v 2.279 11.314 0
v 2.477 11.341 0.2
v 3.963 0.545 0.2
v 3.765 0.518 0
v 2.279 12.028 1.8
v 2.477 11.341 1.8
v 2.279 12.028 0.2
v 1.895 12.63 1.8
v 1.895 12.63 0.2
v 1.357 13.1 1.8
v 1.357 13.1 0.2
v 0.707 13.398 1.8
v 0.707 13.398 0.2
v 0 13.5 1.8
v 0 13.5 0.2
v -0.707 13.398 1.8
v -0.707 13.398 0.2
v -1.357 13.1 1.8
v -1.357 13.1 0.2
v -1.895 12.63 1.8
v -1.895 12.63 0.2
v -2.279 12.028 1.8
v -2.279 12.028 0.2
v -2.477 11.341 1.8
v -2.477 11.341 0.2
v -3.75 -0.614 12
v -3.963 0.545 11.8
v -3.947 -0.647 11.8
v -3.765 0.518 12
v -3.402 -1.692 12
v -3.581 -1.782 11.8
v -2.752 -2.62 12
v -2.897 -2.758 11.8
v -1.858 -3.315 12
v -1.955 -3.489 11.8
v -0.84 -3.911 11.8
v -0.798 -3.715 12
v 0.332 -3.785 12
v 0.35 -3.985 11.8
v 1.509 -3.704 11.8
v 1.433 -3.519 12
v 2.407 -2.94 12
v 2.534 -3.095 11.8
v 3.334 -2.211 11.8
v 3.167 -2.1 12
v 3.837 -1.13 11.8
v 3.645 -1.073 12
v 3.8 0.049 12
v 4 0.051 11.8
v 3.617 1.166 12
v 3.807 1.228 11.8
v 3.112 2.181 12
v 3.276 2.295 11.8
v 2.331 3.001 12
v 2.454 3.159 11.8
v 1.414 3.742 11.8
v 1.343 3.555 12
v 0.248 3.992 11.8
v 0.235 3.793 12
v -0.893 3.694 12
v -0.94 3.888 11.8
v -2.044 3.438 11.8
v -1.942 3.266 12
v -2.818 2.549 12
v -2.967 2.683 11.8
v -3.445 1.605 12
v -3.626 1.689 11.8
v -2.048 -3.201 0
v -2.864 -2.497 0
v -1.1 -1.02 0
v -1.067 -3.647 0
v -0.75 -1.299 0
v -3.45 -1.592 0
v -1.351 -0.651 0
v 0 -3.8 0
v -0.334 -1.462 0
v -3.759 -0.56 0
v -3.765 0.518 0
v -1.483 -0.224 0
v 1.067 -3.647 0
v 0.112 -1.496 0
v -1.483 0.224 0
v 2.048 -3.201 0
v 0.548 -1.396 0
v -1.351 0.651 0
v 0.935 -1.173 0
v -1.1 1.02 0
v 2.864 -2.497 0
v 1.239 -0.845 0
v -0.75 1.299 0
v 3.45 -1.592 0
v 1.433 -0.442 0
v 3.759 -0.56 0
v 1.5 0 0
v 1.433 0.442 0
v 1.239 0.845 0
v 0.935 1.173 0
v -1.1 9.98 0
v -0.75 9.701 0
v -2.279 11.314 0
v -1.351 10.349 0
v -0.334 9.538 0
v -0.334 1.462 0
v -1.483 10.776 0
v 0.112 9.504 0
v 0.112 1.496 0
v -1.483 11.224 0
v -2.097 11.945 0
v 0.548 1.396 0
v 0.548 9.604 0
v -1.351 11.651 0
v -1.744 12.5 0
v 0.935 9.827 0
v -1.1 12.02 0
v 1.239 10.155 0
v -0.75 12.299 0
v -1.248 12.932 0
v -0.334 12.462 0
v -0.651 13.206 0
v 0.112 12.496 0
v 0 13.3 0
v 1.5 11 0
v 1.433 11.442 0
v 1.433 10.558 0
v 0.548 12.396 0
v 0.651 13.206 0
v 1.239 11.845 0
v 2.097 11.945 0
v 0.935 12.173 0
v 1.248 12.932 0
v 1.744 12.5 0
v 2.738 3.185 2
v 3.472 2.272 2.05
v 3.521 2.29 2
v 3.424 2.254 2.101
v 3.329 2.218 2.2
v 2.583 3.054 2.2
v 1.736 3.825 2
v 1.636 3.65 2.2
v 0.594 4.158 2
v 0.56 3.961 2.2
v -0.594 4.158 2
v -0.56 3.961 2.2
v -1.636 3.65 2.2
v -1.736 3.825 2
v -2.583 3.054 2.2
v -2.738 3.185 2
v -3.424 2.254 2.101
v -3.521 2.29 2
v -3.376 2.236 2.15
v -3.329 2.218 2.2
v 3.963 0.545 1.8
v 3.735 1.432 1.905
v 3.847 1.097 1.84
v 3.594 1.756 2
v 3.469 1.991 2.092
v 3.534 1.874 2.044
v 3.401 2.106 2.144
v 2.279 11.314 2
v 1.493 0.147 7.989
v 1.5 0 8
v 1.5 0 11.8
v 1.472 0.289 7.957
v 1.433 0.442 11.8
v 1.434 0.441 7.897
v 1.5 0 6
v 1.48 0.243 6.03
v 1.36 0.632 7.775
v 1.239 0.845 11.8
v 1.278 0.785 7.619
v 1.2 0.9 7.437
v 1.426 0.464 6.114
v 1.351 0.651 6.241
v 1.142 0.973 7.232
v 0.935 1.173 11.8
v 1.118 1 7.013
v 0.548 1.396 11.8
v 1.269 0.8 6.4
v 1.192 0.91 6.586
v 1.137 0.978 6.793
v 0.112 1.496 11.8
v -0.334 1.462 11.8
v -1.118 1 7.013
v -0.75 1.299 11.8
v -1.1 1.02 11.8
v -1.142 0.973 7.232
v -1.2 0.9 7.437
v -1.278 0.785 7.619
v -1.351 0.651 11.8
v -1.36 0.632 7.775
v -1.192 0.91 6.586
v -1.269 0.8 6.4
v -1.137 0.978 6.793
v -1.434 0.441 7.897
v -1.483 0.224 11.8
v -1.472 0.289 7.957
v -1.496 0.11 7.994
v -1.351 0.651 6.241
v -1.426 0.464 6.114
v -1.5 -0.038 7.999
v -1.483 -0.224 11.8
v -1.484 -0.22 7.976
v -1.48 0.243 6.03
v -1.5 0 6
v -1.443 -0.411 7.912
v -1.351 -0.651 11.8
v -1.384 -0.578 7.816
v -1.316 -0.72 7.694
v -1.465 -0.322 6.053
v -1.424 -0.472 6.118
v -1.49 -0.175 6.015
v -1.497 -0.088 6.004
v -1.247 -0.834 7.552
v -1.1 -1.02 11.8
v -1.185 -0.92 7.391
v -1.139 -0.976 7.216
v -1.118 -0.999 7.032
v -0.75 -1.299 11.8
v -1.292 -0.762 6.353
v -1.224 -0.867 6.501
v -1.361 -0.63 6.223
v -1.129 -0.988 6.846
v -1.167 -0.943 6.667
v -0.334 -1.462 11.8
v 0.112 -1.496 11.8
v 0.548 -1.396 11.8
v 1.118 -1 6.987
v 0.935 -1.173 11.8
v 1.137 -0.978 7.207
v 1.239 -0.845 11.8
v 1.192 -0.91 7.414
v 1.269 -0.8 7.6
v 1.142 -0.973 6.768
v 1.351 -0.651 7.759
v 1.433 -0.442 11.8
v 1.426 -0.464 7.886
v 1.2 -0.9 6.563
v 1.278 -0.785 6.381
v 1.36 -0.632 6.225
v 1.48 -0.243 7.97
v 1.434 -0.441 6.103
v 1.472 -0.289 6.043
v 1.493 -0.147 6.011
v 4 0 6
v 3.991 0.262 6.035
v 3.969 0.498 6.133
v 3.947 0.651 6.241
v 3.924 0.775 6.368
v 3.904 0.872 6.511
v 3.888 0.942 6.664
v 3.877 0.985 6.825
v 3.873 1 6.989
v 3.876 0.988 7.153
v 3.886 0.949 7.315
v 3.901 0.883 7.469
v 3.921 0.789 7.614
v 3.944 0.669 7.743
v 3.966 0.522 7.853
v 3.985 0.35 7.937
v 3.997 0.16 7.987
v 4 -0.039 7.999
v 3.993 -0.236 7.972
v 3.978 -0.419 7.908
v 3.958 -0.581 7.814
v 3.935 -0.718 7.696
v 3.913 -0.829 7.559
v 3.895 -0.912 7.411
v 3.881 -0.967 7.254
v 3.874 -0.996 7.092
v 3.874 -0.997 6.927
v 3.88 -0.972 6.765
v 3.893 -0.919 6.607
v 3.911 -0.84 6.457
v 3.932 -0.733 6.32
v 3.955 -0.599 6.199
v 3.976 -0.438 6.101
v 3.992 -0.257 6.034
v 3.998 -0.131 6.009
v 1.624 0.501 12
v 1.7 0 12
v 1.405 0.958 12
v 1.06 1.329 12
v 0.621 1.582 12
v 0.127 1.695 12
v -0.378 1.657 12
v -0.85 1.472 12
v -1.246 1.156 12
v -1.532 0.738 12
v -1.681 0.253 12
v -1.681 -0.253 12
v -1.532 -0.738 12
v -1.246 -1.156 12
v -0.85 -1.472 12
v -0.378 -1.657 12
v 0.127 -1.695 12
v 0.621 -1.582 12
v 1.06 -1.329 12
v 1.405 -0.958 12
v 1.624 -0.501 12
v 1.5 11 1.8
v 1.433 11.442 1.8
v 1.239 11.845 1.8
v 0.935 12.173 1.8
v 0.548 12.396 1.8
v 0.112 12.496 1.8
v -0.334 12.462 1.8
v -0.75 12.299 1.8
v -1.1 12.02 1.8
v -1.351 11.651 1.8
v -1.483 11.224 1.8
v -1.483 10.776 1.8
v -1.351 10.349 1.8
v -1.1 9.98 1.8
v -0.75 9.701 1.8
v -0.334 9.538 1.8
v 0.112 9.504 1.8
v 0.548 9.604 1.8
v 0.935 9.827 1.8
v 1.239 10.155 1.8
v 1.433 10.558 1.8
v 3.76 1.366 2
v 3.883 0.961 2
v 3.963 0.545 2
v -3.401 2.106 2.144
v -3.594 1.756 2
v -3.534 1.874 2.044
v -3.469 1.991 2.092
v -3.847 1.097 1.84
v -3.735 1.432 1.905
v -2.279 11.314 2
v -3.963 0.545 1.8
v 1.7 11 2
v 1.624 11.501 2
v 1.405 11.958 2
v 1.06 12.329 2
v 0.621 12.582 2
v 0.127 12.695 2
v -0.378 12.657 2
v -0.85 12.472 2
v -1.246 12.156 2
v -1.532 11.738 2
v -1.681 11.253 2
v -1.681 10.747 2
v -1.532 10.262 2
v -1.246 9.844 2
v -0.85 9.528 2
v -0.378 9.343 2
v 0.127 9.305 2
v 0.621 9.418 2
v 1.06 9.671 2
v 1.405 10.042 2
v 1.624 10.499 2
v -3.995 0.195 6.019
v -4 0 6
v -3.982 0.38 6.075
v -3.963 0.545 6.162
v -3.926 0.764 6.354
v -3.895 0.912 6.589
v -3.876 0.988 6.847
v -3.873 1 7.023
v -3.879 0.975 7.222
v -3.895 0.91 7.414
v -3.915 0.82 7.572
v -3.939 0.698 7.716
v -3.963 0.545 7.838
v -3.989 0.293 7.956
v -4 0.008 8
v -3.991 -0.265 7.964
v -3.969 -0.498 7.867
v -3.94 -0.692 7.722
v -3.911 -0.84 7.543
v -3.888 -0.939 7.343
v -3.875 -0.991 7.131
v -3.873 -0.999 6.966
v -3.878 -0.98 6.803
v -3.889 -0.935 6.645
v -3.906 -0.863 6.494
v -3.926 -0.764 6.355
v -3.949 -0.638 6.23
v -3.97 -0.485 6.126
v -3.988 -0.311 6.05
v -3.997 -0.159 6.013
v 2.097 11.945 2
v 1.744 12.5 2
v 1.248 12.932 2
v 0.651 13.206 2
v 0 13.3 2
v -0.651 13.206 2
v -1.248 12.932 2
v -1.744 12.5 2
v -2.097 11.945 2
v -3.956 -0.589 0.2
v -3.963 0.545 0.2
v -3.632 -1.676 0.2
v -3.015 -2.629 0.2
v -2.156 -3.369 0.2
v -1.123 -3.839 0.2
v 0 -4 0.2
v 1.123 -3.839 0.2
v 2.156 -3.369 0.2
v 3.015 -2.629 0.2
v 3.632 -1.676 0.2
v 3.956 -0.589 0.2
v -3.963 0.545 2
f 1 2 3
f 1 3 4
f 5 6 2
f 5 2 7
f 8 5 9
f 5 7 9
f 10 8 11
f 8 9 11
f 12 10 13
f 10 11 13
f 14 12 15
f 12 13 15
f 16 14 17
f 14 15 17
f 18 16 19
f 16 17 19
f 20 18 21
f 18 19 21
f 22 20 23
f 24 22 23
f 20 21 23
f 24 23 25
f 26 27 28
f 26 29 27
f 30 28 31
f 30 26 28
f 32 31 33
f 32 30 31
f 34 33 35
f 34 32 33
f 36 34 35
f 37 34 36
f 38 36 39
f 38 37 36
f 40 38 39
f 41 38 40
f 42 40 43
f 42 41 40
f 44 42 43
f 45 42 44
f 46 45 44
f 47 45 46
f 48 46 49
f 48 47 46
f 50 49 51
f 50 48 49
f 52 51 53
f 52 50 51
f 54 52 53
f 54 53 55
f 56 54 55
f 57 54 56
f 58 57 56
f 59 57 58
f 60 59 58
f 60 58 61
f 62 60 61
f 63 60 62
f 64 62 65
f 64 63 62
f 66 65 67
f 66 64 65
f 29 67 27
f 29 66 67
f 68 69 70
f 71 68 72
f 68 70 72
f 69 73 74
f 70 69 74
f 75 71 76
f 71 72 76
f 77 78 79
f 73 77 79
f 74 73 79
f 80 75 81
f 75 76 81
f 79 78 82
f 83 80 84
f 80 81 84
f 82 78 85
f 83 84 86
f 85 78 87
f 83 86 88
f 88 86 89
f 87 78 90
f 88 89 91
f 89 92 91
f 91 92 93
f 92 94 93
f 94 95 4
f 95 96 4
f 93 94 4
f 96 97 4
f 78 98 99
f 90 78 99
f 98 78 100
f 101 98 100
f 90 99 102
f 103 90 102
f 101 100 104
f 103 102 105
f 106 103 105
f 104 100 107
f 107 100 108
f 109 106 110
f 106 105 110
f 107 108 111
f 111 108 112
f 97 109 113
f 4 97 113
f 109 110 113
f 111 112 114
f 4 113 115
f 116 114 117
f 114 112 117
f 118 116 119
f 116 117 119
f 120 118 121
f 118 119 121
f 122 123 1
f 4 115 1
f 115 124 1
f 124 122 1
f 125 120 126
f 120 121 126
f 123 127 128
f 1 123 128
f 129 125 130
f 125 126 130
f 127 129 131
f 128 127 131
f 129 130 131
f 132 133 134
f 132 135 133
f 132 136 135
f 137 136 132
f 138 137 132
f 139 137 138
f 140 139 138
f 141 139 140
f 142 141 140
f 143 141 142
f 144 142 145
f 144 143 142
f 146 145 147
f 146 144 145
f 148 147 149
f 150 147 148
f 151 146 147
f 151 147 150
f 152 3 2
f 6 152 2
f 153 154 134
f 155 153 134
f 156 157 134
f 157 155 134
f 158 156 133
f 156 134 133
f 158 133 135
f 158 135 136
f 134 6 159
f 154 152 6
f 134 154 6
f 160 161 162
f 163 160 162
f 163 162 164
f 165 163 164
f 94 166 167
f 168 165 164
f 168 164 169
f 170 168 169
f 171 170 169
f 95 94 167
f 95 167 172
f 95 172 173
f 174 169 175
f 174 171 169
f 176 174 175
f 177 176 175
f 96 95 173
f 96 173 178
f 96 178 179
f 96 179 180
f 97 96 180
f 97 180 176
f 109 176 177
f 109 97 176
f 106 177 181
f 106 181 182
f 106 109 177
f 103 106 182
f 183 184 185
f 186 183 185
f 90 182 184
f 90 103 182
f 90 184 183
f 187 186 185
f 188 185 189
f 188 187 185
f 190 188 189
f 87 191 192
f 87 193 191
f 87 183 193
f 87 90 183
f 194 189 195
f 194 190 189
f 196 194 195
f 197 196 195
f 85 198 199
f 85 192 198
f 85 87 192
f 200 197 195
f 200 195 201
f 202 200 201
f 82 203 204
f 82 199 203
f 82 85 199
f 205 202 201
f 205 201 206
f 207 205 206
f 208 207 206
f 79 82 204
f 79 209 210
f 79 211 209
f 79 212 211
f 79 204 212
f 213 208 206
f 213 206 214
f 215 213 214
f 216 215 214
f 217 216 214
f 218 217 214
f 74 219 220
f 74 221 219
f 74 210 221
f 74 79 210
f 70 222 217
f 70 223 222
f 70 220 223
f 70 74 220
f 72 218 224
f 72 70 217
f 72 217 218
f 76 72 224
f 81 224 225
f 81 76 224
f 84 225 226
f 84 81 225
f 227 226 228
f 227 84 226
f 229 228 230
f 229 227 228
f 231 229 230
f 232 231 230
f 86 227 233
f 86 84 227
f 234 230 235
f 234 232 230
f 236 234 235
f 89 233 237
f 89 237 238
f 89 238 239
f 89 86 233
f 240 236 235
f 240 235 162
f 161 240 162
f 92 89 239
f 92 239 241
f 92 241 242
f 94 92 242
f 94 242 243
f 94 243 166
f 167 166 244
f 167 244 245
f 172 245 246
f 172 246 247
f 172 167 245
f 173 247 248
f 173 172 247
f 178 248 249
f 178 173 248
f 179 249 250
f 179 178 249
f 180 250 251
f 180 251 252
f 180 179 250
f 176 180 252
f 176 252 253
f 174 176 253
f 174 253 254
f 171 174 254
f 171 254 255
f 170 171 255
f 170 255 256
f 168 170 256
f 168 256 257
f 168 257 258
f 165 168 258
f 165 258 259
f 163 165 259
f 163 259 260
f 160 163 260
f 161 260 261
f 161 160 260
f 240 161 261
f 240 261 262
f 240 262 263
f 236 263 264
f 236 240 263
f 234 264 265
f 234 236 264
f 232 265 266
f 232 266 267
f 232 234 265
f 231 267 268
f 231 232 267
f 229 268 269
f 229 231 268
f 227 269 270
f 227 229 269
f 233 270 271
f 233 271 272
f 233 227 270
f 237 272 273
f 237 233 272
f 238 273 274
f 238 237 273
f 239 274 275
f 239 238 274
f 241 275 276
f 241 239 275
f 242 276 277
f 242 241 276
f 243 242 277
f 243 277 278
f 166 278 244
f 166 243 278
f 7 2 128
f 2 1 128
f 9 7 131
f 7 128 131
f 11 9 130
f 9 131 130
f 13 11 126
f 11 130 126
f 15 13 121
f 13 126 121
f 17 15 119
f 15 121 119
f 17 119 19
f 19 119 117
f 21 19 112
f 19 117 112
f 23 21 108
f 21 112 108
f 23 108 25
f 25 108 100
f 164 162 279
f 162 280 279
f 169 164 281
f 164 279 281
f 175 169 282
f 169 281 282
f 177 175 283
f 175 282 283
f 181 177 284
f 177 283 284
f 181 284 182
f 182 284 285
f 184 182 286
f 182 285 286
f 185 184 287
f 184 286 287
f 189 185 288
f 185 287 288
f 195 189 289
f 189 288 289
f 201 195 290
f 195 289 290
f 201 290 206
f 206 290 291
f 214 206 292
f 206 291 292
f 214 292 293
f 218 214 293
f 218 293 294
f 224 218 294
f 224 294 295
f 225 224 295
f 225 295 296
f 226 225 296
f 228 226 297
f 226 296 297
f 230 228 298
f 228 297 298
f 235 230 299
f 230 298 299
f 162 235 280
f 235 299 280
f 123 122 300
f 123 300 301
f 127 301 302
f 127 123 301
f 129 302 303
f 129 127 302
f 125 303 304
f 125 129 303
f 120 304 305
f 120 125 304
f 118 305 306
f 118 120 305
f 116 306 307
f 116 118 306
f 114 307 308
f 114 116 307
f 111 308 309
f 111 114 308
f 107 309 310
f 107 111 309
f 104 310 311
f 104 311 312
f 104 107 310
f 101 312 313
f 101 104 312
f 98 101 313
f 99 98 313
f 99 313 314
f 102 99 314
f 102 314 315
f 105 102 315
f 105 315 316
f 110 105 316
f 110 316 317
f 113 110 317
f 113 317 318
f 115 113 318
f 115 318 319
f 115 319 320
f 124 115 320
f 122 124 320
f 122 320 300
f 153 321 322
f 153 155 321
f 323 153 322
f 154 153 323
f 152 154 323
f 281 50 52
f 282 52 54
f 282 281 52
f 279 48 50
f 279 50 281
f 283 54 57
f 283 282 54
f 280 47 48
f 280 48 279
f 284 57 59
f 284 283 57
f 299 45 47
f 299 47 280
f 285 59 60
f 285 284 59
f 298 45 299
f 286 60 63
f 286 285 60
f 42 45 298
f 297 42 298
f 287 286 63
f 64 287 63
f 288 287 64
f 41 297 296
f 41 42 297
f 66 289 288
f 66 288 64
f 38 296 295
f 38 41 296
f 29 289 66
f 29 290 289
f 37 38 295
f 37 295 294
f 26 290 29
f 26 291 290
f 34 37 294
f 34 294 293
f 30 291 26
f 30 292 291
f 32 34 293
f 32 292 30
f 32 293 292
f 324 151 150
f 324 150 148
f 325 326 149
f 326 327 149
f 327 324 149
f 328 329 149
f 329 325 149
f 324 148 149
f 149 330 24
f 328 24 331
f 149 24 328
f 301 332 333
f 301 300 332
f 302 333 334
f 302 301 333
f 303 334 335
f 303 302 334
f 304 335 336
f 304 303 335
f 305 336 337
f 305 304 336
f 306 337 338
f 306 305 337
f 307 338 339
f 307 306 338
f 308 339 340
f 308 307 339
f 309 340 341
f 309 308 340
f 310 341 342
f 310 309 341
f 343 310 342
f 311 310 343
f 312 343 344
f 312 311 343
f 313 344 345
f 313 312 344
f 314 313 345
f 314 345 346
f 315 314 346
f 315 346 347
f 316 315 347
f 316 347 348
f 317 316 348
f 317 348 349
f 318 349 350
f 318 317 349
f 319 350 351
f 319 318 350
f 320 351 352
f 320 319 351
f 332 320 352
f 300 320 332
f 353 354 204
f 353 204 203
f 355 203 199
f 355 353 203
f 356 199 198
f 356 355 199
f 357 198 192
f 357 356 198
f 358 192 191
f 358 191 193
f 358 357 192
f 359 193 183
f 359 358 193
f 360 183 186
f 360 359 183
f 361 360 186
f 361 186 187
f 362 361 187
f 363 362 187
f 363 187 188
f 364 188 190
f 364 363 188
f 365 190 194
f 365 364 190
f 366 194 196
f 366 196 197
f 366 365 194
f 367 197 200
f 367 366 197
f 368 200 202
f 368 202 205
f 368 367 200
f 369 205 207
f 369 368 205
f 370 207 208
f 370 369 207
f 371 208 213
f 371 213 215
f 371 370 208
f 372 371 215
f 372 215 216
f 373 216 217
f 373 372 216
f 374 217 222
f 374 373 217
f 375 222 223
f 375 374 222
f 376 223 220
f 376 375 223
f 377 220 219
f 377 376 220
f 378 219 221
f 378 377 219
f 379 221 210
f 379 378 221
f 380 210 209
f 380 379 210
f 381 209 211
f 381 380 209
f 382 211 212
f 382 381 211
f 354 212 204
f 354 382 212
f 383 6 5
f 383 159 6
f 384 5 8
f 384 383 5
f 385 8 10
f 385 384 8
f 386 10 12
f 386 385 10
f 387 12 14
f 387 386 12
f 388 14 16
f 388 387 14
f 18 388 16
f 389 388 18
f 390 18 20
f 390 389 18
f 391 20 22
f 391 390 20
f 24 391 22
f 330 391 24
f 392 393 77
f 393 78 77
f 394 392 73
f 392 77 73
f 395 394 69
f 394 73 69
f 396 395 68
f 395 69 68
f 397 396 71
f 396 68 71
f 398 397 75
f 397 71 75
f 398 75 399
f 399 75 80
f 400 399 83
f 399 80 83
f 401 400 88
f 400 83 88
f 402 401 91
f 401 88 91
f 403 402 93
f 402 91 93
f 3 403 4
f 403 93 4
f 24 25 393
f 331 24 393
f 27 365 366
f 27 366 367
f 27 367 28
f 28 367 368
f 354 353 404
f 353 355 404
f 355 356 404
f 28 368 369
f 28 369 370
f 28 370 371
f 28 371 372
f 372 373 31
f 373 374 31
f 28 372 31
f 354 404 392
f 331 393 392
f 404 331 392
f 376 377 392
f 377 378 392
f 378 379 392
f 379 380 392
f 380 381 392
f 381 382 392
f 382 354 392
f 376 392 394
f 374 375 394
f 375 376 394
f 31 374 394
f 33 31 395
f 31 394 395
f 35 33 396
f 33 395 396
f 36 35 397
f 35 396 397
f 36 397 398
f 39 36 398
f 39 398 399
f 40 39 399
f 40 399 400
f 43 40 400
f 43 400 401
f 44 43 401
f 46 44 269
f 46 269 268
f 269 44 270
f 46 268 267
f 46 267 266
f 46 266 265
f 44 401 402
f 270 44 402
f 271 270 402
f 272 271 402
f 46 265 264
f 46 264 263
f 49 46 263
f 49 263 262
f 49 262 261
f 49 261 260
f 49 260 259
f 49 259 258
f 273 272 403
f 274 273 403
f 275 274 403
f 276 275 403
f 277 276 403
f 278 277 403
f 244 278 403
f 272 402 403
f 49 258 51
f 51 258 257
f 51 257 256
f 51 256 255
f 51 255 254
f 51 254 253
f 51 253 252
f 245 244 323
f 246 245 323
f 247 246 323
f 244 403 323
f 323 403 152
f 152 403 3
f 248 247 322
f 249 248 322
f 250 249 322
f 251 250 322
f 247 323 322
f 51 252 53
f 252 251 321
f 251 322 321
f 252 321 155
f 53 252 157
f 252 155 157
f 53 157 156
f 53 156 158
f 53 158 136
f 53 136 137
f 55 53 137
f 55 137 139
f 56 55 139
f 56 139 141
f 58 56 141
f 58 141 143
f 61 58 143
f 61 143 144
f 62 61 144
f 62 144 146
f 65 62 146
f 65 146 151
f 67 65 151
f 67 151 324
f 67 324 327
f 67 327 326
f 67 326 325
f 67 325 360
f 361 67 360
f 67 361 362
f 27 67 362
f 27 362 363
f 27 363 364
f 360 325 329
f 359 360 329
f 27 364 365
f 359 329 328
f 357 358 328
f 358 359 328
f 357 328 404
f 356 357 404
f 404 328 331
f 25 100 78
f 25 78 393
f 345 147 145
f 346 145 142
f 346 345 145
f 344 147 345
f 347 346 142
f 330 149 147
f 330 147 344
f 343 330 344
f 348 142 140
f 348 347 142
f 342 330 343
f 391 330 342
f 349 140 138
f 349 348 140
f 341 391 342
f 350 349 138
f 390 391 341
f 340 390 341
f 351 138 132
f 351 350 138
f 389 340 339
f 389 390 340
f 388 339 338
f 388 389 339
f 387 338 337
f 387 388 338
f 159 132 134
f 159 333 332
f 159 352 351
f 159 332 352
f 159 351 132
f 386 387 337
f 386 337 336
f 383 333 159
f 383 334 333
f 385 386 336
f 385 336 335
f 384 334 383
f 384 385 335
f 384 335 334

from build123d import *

# Parameters (mm, degrees)
SKETCH1_R               = 1.5
BOSS_EXTRUDE1_DEPTH     = 2
SKETCH2_R               = 4
SKETCH2_R_2             = 1.5
BOSS_EXTRUDE2_DEPTH     = 10
CUT_EXTRUDE1_DEPTH      = 19.5
CUT_EXTRUDE1_DEPTH_BACK = 19.5
SKETCH3_R               = 1
CHAMFER1_SIZE           = 0.2
CHAMFER2_SIZE           = 0.2


with BuildPart() as part:
    # Sketch1 → Boss-Extrude1 (new body)
    with BuildSketch(Plane.XY):
        with BuildLine():
            Line((-2.476647127, 11.340909091), (-3.962635403, 0.545454545))
            ThreePointArc((-3.962635403, 0.545454545), (0, -4), (3.962635403, 0.545454545))
            Line((3.962635403, 0.545454545), (2.476647127, 11.340909091))
            ThreePointArc((2.476647127, 11.340909091), (0, 13.5), (-2.476647127, 11.340909091))
        make_face()
        with Locations((0, 11)):
            Circle(SKETCH1_R, mode=Mode.SUBTRACT)
        Circle(SKETCH1_R, mode=Mode.SUBTRACT)
    extrude(amount=BOSS_EXTRUDE1_DEPTH)

    # Sketch2 → Boss-Extrude2 (add)
    with BuildSketch(Plane.XY.offset(2)):
        with Locations(Location((0, 0, 0), (0, 0, 172.162520237))):
            Circle(SKETCH2_R)
        Circle(SKETCH2_R_2, mode=Mode.SUBTRACT)
    extrude(amount=BOSS_EXTRUDE2_DEPTH)

    # Sketch3 → Cut-Extrude1 (cut, two sides: drawn at the far end of the back side and taken through both)
    with BuildSketch(Plane(origin=(0, 0, 0), x_dir=(0, 0, -1), z_dir=(1, 0, 0)).offset(-CUT_EXTRUDE1_DEPTH_BACK)):
        with Locations((-7, 0)):
            Circle(SKETCH3_R)
    extrude(amount=CUT_EXTRUDE1_DEPTH + CUT_EXTRUDE1_DEPTH_BACK, mode=Mode.SUBTRACT)

    # Chamfer1
    # the kernel refuses this chamfer: 0.2 mm, written as the material it takes off along each edge
    with BuildSketch(Plane(origin=(0, 11, 2), x_dir=(1, 0, 0), z_dir=(0, -1, 0))) as chamfer1_piece_1:
        Polygon((1.5 + CHAMFER1_SIZE, 0), (1.5, -CHAMFER1_SIZE), (1.5, 0), align=None)
    revolve(axis=Axis((0, 11, 2), (0, 0, 1)), mode=Mode.SUBTRACT)
    with BuildSketch(Plane(origin=(0, 11, 2), x_dir=(0.9906588508046985, 0.13636363636363596, 0), z_dir=(0.13636363636363596, -0.9906588508046985, 0))) as chamfer1_piece_2:
        Polygon((2.5, -CHAMFER1_SIZE), (2.5 - CHAMFER1_SIZE, 0), (2.5, 0), align=None)
    revolve(axis=Axis((0, 11, 2), (0, 0, 1)), revolution_arc=164.325040474, mode=Mode.SUBTRACT)
    with BuildSketch(Plane(origin=(-2.476647127, 11.340909091, 2), x_dir=(0.9902842994465351, -0.13631207957881322, 0.02749587661058738), z_dir=(-0.1363636363636364, -0.9906588508046986, 0))) as chamfer1_piece_3_section:
        Polygon((CHAMFER1_SIZE * 0.999621916911, -CHAMFER1_SIZE * 0.0274958766106), (-CHAMFER1_SIZE * 0.0274958766106, -CHAMFER1_SIZE * 0.999621916911), (0, 0), align=None)
    chamfer1_piece_3 = extrude(amount=11.411583956, mode=Mode.PRIVATE)
    chamfer1_piece_3 = chamfer1_piece_3 - Plane(origin=(0, 0, 1.932985059), x_dir=(-0.9906588508048991, 0.13636363636217924, 0), z_dir=(0, 0, -1)) * Cylinder(4, 24, mode=Mode.PRIVATE)
    add(chamfer1_piece_3, mode=Mode.SUBTRACT)
    with BuildSketch(Plane(origin=(0, 0, 12), x_dir=(-0.9906588508048991, 0.13636363636217924, 0), z_dir=(0.13636363636217924, 0.9906588508048991, 0))) as chamfer1_piece_4:
        Polygon((4, -CHAMFER1_SIZE), (4 - CHAMFER1_SIZE, 0), (4, 0), align=None)
    revolve(axis=Axis((0, 0, 12), (0, 0, 1)), mode=Mode.SUBTRACT)
    with BuildSketch(Plane(origin=(0, 0, 12), x_dir=(1, 0, 0), z_dir=(0, -1, 0))) as chamfer1_piece_5:
        Polygon((1.5, -CHAMFER1_SIZE), (1.5 + CHAMFER1_SIZE, 0), (1.5, 0), align=None)
    revolve(axis=Axis((0, 0, 12), (0, 0, 1)), mode=Mode.SUBTRACT)
    with BuildSketch(Plane(origin=(-2.476647127, 11.340909091, 0), x_dir=(0.9902842994465351, -0.13631207957881322, -0.027495876610586414), z_dir=(-0.1363636363636364, -0.9906588508046986, 0))) as chamfer1_piece_6:
        Polygon((CHAMFER1_SIZE * 0.999621916911, CHAMFER1_SIZE * 0.0274958766106), (-CHAMFER1_SIZE * 0.0274958766106, CHAMFER1_SIZE * 0.999621916911), (0, 0), align=None)
    extrude(amount=10.897247359, mode=Mode.SUBTRACT)
    with BuildSketch(Plane(origin=(0, 11, 0), x_dir=(0.9906588508046985, 0.13636363636363596, 0), z_dir=(0.13636363636363596, -0.9906588508046985, 0))) as chamfer1_piece_7:
        Polygon((2.5, CHAMFER1_SIZE), (2.5 - CHAMFER1_SIZE, 0), (2.5, 0), align=None)
    revolve(axis=Axis((0, 11, 0), (0, 0, 1)), revolution_arc=164.325040474, mode=Mode.SUBTRACT)
    with BuildSketch(Plane(origin=(3.962635403, 0.545454545, 0), x_dir=(0.027239033524910743, 0.0037494377196253415, 0.9996219169112968), z_dir=(-0.1363636363636364, 0.9906588508046986, 0))) as chamfer1_piece_8:
        Polygon((CHAMFER1_SIZE * 0.999621916911, -CHAMFER1_SIZE * 0.0274958766106), (-CHAMFER1_SIZE * 0.0274958766106, -CHAMFER1_SIZE * 0.999621916911), (0, 0), align=None)
    extrude(amount=10.897247359, mode=Mode.SUBTRACT)
    with BuildSketch(Plane(origin=(0, 0, 0), x_dir=(-0.9906588508046986, 0.13636363636363646, 0), z_dir=(0.13636363636363646, 0.9906588508046986, 0))) as chamfer1_piece_9:
        Polygon((4, CHAMFER1_SIZE), (4 - CHAMFER1_SIZE, 0), (4, 0), align=None)
    revolve(axis=Axis((0, 0, 0), (0, 0, 1)), revolution_arc=195.674959526, mode=Mode.SUBTRACT)
    with BuildSketch(Plane(origin=(4.032772212, 0.035922443, 2), x_dir=(0.02723903352491077, 0.003749437719625345, -0.9996219169112968), z_dir=(-0.1363636363636364, 0.9906588508046986, 0))) as chamfer1_piece_10_section:
        Polygon((CHAMFER1_SIZE * 0.999621916911, CHAMFER1_SIZE * 0.0274958766106), (-CHAMFER1_SIZE * 0.0274958766106, CHAMFER1_SIZE * 0.999621916911), (0, 0), align=None)
    chamfer1_piece_10 = extrude(amount=11.411583956, mode=Mode.PRIVATE)
    chamfer1_piece_10 = chamfer1_piece_10 - Plane(origin=(0, 0, 1.932985114), x_dir=(-0.9906588508048991, 0.13636363636217924, 0), z_dir=(0, 0, -1)) * Cylinder(4, 24, mode=Mode.PRIVATE)
    add(chamfer1_piece_10, mode=Mode.SUBTRACT)

    # Chamfer2
    # the kernel refuses this chamfer: 0.2 mm, written as the material it adds along each edge
    with BuildSketch(Plane(origin=(0, 0, 2), x_dir=(0.9474392315450817, 0.31993577875765195, 0), z_dir=(0.31993577875765195, -0.9474392315450817, 0))) as chamfer2_piece_1_section:
        Polygon((4 + CHAMFER2_SIZE, 0), (4, CHAMFER2_SIZE), (4, 0), align=None)
    chamfer2_piece_1 = revolve(axis=Axis((0, 0, 2), (0, 0, 1)), revolution_arc=142.681917796, mode=Mode.PRIVATE)
    chamfer2_piece_1 = split(chamfer2_piece_1, bisect_by=Plane(origin=(1.558048565, 4.310442532, 3.668717781), z_dir=(-0.700501591246356, -0.0964236519801952, -0.7071067811866362)), keep=Keep.TOP, mode=Mode.PRIVATE)
    chamfer2_piece_1 = split(chamfer2_piece_1, bisect_by=Plane(origin=(-1.558048565, 4.310442532, 3.668717781), z_dir=(0.7005015912467089, -0.09642365198024379, -0.70710678118628)), keep=Keep.TOP, mode=Mode.PRIVATE)
    add(chamfer2_piece_1)


solid = part.part
